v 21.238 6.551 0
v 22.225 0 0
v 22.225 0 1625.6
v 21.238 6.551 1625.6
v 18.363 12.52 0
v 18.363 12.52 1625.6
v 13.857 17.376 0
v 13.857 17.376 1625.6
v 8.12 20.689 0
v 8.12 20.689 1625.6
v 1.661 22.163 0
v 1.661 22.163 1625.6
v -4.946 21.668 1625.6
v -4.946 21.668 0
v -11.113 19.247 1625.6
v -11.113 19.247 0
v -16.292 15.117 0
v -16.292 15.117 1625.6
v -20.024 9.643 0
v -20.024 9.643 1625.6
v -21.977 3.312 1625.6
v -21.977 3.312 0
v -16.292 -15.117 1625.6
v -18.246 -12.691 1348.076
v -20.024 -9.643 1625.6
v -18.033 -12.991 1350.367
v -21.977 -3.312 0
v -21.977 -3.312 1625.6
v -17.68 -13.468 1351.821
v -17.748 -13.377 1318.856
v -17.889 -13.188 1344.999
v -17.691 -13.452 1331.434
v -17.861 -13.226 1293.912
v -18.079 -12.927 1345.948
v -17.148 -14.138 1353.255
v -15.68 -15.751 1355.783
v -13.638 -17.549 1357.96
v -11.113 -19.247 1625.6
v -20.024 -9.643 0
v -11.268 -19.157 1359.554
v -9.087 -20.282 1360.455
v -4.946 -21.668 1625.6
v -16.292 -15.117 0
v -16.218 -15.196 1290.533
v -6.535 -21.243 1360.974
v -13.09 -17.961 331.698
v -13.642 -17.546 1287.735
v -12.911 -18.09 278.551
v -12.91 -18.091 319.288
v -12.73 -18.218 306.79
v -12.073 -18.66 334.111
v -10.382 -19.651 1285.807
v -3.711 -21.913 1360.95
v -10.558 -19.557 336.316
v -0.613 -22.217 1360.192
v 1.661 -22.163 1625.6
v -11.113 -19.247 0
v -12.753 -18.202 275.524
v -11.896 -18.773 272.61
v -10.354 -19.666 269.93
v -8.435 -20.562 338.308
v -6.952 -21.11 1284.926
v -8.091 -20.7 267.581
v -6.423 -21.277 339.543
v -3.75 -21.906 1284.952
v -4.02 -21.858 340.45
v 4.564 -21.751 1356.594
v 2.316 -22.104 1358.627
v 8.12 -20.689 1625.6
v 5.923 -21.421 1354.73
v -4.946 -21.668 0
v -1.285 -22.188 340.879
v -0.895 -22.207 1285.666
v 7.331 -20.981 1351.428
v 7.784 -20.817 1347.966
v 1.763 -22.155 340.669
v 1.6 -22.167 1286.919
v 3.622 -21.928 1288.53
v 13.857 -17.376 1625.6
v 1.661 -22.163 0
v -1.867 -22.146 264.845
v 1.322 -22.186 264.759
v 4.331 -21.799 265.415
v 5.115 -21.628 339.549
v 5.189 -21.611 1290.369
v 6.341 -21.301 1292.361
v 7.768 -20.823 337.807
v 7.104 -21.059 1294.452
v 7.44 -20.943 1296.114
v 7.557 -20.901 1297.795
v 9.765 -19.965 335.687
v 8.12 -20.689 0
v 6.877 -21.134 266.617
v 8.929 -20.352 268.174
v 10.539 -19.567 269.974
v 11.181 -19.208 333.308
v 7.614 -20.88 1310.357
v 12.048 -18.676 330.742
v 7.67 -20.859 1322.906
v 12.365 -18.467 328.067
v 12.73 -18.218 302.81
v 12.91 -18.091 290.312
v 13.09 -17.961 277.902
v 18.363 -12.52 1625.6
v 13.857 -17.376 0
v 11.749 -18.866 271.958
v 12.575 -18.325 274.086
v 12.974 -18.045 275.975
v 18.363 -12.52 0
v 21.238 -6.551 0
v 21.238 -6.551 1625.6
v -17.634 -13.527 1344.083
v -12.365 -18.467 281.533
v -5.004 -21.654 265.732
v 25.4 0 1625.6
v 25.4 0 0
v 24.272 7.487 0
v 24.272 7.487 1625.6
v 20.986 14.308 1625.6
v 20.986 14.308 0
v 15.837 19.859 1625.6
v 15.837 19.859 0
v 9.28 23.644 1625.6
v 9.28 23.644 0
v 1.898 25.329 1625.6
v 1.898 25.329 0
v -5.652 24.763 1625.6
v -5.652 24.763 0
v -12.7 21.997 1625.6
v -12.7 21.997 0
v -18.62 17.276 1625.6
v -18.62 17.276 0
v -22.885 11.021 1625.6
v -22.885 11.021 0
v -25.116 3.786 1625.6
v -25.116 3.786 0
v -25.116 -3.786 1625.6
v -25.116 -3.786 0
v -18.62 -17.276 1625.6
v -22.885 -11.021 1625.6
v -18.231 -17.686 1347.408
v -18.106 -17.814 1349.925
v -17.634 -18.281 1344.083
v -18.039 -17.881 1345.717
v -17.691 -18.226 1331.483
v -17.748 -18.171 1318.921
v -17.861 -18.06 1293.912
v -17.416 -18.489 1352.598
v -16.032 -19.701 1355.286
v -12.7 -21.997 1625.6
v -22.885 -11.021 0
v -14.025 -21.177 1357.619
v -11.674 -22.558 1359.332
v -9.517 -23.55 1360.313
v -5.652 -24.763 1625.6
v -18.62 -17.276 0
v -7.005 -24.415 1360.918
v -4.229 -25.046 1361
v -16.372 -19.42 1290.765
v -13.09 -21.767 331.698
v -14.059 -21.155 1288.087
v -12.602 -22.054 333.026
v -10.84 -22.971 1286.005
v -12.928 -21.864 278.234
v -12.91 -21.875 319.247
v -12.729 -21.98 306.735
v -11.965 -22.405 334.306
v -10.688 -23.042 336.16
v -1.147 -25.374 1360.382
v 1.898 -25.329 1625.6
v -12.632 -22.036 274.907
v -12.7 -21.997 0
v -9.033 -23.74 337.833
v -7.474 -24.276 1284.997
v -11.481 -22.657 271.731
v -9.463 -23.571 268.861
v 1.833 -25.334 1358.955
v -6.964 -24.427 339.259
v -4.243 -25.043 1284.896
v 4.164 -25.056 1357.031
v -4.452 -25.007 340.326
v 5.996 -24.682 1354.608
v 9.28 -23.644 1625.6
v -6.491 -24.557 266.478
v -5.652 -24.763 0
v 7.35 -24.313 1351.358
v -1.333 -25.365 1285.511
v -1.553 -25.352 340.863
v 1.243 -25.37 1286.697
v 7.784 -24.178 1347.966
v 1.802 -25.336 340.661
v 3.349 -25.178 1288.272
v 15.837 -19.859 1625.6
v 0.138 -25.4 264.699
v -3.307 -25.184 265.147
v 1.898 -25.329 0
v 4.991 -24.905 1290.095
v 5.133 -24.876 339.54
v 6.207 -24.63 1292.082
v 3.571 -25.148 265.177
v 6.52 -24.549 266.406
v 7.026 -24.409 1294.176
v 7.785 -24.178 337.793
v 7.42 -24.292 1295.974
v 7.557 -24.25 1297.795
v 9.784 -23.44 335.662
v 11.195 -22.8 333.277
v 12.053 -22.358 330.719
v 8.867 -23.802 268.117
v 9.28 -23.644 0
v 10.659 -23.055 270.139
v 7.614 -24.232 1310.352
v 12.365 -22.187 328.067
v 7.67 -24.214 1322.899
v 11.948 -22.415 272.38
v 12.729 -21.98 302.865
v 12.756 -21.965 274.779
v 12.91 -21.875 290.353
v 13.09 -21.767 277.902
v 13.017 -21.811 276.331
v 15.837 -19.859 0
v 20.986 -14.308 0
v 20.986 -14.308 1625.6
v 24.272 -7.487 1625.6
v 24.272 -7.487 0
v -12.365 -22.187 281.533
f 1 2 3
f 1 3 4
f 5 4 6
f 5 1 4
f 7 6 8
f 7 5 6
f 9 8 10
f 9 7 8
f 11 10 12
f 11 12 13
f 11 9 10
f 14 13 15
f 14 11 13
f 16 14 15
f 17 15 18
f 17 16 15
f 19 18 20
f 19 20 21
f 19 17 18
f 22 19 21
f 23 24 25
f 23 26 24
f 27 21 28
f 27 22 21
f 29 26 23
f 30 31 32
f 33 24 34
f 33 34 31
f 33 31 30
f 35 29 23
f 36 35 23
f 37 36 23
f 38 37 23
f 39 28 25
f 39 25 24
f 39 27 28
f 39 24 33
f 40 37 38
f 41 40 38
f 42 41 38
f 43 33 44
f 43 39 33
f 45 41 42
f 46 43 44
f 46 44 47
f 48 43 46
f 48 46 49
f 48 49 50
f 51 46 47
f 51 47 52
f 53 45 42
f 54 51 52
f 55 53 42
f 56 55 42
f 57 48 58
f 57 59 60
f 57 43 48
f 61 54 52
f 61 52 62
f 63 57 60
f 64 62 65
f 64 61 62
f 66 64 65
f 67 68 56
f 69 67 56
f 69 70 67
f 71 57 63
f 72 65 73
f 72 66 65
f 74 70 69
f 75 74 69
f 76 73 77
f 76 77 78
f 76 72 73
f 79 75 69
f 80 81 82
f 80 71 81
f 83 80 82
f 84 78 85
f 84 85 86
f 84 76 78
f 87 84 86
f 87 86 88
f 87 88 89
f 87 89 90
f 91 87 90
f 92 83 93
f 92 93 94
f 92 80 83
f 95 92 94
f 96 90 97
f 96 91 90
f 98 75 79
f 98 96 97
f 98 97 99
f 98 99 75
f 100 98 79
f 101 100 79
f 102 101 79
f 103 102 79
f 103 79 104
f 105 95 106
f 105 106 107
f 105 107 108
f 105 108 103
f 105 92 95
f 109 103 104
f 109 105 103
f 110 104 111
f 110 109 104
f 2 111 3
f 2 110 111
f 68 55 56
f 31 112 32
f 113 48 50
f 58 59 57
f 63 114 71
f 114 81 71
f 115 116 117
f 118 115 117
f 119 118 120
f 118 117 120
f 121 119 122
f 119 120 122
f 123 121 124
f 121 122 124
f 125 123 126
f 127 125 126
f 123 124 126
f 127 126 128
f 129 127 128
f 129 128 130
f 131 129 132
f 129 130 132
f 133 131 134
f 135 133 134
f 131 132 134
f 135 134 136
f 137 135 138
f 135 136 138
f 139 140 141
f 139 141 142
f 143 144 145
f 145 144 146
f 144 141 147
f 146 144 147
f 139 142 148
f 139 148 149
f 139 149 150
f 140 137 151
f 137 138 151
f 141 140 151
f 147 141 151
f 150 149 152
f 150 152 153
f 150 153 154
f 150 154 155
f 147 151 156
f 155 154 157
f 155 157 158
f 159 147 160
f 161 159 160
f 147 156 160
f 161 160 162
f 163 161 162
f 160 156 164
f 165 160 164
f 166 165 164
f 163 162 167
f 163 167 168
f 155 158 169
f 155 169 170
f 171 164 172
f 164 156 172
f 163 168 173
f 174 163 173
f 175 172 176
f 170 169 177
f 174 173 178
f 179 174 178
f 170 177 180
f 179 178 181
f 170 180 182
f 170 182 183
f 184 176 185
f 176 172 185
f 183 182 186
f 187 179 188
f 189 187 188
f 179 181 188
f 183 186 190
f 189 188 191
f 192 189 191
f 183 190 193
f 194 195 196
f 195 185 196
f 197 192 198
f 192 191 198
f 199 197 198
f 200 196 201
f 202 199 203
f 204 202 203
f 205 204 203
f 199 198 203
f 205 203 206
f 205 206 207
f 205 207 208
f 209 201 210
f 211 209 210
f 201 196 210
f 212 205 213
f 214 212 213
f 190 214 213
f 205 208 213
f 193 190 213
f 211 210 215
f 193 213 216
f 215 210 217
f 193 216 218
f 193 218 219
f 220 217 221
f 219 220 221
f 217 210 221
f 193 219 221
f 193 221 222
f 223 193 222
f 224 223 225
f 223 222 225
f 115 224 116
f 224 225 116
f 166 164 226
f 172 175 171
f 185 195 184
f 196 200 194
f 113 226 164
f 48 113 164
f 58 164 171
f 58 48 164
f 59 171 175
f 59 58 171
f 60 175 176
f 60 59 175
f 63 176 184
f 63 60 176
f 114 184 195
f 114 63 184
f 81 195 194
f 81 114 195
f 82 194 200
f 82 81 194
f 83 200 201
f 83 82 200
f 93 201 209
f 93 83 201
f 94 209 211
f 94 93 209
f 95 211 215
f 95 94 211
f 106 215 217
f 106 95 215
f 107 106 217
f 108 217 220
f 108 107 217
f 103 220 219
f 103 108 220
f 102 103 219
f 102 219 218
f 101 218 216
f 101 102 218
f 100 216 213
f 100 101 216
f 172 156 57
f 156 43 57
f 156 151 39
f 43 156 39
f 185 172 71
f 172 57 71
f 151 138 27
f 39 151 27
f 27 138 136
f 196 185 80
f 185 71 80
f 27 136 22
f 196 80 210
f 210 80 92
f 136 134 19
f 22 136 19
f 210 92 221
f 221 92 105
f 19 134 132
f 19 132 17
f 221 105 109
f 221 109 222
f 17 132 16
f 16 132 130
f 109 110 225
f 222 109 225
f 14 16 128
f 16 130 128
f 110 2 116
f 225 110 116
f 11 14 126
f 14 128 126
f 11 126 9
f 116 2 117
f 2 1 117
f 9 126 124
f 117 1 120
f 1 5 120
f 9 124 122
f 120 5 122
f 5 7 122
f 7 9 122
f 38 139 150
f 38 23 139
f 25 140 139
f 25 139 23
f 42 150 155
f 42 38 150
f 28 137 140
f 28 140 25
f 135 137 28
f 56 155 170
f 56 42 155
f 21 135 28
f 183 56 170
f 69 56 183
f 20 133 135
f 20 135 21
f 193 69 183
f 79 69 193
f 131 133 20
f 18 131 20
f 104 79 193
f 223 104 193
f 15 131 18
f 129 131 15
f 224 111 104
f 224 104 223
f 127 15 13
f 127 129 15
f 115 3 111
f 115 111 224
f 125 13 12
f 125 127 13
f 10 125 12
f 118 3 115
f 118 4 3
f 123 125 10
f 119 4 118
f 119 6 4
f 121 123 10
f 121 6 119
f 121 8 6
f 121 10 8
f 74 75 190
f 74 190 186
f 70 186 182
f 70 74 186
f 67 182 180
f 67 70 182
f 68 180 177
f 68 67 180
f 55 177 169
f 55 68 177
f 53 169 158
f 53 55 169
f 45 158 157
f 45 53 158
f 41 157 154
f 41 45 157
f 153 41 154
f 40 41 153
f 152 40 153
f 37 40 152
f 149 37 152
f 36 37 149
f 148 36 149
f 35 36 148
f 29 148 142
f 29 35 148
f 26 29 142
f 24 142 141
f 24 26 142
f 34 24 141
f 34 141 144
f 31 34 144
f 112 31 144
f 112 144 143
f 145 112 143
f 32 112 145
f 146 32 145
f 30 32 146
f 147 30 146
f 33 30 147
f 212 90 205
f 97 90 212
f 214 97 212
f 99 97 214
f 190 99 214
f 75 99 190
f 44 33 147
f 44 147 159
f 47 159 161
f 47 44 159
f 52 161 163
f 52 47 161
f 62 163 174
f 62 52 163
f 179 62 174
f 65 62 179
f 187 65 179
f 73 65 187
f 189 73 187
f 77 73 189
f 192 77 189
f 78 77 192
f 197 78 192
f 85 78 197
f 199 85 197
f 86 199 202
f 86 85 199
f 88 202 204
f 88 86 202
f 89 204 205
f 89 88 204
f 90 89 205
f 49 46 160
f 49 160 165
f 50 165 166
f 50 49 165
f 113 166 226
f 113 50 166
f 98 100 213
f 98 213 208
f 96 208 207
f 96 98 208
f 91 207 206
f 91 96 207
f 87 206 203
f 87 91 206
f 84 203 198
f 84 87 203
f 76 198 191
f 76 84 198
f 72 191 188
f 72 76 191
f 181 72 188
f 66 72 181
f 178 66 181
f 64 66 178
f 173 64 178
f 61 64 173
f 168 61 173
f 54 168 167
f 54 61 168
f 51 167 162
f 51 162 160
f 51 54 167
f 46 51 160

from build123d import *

# Parameters (mm, degrees)
F1_R     = 25.4
F1_R_2   = 22.225
F2_DEPTH = 1625.6
F4_DEPTH = 50


with BuildPart() as f2:
    # F1 (on Top) → F2 (new body)
    with BuildSketch(Plane.XY):
        Circle(F1_R)
        Circle(F1_R_2, mode=Mode.SUBTRACT)
    extrude(amount=F2_DEPTH)

    # F3 (on Front) → F4 (cut)
    with BuildSketch(Plane.XZ):
        with BuildLine():
            ThreePointArc((12.3654246976, 328.0673227027), (1.1899269468, 340.763681787), (-13.0896388975, 331.698182172))
            Line((-13.0896388975, 331.698182172), (-12.3654246976, 281.5326772973))
            ThreePointArc((-12.3654246976, 281.5326772973), (-1.7614192029, 264.8297264279), (13.0896388975, 277.901817828))
            Line((13.0896388975, 277.901817828), (12.3654246976, 328.0673227027))
        make_face()
        with BuildLine():
            ThreePointArc((-17.8609726221, 1293.9123234562), (-3.4922049716, 1284.9888824058), (7.5568313695, 1297.7954463442))
            Line((7.5568313695, 1297.7954463442), (7.7835105534, 1347.9656664163))
            ThreePointArc((7.7835105534, 1347.9656664163), (-7.1964552661, 1360.8898346418), (-17.6342934381, 1344.0825435284))
            Line((-17.6342934381, 1344.0825435284), (-17.8609726221, 1293.9123234562))
        make_face()
    extrude(amount=F4_DEPTH, mode=Mode.SUBTRACT)


solid = f2.part
